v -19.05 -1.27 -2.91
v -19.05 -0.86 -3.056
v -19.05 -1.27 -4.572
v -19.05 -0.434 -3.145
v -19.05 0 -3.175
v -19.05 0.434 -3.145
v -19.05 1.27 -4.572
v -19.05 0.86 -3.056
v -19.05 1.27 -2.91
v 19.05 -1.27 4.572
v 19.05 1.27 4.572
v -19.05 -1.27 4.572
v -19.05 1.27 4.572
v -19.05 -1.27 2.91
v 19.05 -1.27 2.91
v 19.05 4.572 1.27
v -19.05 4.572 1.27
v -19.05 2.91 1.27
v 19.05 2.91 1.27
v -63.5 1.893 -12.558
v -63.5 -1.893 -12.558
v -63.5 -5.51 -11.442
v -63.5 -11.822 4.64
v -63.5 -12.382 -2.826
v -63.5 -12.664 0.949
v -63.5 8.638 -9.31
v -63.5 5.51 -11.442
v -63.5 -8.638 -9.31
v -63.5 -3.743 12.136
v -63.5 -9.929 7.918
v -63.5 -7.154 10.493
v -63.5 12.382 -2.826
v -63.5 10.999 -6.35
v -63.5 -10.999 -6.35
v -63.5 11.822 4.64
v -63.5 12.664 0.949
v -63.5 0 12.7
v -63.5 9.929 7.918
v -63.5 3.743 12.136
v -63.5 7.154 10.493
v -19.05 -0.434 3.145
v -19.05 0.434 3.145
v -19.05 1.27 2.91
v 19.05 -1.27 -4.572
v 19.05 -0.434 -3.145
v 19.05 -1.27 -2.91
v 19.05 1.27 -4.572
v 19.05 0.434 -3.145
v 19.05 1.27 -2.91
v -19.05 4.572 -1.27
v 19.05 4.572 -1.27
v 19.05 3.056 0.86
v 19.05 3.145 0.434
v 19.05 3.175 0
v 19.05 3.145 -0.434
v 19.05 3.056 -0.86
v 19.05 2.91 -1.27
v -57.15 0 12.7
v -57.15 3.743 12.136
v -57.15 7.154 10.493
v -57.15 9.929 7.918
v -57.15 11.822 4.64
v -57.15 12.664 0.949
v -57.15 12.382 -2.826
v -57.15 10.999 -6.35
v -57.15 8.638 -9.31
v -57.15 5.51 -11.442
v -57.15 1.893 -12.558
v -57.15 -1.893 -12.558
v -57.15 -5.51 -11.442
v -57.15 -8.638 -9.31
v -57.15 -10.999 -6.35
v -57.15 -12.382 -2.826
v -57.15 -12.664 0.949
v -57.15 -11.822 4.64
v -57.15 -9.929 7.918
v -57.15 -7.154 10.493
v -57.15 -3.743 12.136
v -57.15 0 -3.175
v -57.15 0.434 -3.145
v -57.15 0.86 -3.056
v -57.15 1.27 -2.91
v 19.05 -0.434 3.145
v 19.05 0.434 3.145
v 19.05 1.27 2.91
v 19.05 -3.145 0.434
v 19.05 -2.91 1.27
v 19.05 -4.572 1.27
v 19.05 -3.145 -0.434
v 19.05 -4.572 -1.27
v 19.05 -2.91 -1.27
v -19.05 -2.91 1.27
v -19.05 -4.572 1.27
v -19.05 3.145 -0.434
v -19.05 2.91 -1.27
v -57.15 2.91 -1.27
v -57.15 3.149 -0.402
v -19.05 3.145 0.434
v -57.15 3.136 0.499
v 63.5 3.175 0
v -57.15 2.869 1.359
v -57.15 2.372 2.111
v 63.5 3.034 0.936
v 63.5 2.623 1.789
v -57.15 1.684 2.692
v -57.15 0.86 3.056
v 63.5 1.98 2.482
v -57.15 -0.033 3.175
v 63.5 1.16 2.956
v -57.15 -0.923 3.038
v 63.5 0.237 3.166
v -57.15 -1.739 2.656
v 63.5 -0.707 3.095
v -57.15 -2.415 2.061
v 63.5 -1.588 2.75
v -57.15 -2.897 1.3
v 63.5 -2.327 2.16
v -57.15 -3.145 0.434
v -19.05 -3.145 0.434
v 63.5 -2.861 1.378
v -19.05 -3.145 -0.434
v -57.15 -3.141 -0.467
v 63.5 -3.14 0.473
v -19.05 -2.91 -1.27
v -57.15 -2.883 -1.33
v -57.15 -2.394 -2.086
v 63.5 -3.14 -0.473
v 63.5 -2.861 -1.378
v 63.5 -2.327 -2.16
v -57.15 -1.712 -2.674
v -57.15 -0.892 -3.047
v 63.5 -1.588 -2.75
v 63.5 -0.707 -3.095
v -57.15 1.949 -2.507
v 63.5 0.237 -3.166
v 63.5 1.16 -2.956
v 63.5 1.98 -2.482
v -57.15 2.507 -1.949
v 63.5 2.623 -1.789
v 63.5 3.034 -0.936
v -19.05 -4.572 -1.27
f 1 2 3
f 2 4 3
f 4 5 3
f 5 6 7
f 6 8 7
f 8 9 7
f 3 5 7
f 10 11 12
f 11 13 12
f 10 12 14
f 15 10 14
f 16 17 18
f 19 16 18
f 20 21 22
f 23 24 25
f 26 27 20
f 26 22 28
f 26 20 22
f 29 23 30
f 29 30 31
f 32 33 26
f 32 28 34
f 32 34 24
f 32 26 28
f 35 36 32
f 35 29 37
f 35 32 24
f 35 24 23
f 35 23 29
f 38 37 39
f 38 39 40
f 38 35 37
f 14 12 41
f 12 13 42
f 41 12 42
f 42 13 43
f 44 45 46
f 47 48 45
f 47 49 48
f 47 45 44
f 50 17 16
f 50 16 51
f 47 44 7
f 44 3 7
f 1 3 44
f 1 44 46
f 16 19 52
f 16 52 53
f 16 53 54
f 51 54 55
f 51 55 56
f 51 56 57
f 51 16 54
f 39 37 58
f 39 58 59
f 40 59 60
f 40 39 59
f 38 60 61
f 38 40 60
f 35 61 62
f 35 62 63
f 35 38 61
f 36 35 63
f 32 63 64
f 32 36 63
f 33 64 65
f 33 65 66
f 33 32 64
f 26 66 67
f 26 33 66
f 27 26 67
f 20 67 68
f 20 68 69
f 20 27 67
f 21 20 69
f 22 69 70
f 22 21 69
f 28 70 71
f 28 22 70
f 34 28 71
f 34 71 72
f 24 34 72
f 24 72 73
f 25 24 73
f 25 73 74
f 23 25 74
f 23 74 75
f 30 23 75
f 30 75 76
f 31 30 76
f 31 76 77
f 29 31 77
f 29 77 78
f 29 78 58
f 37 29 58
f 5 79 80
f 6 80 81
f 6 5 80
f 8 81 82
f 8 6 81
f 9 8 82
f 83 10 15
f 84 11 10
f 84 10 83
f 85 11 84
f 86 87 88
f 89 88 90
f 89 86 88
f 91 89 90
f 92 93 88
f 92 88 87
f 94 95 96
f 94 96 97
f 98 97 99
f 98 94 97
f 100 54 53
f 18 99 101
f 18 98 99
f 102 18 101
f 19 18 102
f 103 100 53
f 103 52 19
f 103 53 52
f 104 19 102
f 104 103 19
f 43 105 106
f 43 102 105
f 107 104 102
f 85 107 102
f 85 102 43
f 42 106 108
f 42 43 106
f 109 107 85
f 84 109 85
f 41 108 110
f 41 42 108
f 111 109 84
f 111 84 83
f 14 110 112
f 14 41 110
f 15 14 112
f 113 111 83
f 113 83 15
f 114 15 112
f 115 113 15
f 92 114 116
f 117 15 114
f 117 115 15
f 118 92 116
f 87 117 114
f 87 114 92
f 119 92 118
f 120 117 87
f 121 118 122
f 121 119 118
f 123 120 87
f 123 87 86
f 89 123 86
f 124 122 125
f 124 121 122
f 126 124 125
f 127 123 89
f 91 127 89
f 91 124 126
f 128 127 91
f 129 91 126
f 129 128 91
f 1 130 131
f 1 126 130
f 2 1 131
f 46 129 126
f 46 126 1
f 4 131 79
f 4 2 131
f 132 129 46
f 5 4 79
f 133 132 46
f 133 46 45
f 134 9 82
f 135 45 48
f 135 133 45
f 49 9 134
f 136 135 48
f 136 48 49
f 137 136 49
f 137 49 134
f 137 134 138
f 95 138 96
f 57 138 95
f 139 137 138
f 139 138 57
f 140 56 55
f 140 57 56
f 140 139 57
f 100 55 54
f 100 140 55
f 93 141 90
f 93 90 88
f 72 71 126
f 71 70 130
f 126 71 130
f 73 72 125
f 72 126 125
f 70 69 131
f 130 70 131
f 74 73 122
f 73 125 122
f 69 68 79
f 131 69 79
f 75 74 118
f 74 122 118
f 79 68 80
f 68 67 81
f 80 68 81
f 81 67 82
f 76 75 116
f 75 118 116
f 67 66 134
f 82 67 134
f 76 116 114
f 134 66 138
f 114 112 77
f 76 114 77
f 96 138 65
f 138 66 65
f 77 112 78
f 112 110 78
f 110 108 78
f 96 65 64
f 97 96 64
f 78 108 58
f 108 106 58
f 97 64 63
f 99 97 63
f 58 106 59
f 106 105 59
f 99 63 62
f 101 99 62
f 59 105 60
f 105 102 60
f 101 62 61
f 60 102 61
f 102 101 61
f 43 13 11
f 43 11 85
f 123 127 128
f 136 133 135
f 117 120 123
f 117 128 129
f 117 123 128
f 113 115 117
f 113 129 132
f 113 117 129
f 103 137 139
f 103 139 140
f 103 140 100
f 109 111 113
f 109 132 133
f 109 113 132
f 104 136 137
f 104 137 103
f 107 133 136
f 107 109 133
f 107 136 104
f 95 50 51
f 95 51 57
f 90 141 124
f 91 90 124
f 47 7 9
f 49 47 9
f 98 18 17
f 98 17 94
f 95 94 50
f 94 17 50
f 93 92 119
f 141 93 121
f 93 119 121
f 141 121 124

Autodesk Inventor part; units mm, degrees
ref_plane "YZ Plane" through (0, 0, 0) normal (1, 0, 0) x (0, 1, 0)
ref_plane "XZ Plane" through (0, 0, 0) normal (0, 1, 0) x (-1, 0, 0)
sketch "Sketch2" plane through (0, 0, 0) normal (1, 0, 0) x (0, 1, 0)
  circle A0 centre (0, 0) radius 3.175
  dimension "d0" = 6.35
extrude "Extrusion1" add sketch "Sketch2" along normal mid plane 127
sketch "Sketch3" plane through (-63.5, 0, 0) normal (-1, 0, 0) x (0, 0, 1)
  circle A0 centre (0, 0) radius 12.7
  dimension "d3" = 25.4
extrude "Extrusion2" add sketch "Sketch3" against normal blind 6.35
sketch "Sketch4" plane through (-57.15, 0, 0) normal (1, 0, 0) x (0, 0, -1)
  line L0 (0, 4.572) -> (1.27, 4.572)
  line L1 (1.27, 4.572) -> (1.27, 2.9099)
  circle A0 centre (0, 0) radius 3.175 projected
  line L2 (0, -17.78) -> (0, 17.78) projected
  line L3 (0, 4.572) -> (-1.27, 4.572)
  line L4 (-1.27, 4.572) -> (-1.27, 2.9099)
  line L5 (-4.572, 0) -> (-4.572, -1.27)
  line L6 (-4.572, 0) -> (-4.572, 1.27)
  line L7 (-4.572, 1.27) -> (-2.9099, 1.27)
  line L8 (-4.572, -1.27) -> (-2.9099, -1.27)
  line L9 (0, -4.572) -> (1.27, -4.572)
  line L10 (0, -4.572) -> (-1.27, -4.572)
  line L11 (-1.27, -4.572) -> (-1.27, -2.9099)
  line L12 (1.27, -4.572) -> (1.27, -2.9099)
  line L13 (4.572, 0) -> (4.572, 1.27)
  line L14 (4.572, 0) -> (4.572, -1.27)
  line L15 (4.572, -1.27) -> (2.9099, -1.27)
  line L16 (4.572, 1.27) -> (2.9099, 1.27)
  arc A1 (1.27, 2.9099) -> (-1.27, 2.9099) centre (0, 0) ccw
  arc A2 (2.9099, -1.27) -> (2.9099, 1.27) centre (0, 0) ccw
  arc A3 (-2.9099, 1.27) -> (-2.9099, -1.27) centre (0, 0) ccw
  arc A4 (-1.27, -2.9099) -> (1.27, -2.9099) centre (0, 0) ccw
  dimension "d7" = 1.27
  dimension "d10" = 360
  dimension "d15" = 1.397
extrude "Extrusion3" add sketch "Sketch4" along normal blind 76.2 contours L0 L1 A0 L2 | L2 A0 L4 L3 | L2 L10 L11 A0 | A0 L12 L9 L2 | L16 L13 L14 L15 A0 | A0 L8 L5 L6 L7
ref_plane "Work Plane1" through (-19.05, 0, 0) normal (1, 0, 0) x (0, 0, -1)
sketch "Sketch5" plane through (-19.05, 0, 0) normal (1, 0, 0) x (0, 0, -1)
  circle A0 centre (0, 0) radius 3.175
  circle A1 centre (0, 0) radius 5.4209
extrude "Extrusion4" cut sketch "Sketch5" against normal blind 38.1
properties part number "ShaftForWormGear" material "PBT Plastic"
